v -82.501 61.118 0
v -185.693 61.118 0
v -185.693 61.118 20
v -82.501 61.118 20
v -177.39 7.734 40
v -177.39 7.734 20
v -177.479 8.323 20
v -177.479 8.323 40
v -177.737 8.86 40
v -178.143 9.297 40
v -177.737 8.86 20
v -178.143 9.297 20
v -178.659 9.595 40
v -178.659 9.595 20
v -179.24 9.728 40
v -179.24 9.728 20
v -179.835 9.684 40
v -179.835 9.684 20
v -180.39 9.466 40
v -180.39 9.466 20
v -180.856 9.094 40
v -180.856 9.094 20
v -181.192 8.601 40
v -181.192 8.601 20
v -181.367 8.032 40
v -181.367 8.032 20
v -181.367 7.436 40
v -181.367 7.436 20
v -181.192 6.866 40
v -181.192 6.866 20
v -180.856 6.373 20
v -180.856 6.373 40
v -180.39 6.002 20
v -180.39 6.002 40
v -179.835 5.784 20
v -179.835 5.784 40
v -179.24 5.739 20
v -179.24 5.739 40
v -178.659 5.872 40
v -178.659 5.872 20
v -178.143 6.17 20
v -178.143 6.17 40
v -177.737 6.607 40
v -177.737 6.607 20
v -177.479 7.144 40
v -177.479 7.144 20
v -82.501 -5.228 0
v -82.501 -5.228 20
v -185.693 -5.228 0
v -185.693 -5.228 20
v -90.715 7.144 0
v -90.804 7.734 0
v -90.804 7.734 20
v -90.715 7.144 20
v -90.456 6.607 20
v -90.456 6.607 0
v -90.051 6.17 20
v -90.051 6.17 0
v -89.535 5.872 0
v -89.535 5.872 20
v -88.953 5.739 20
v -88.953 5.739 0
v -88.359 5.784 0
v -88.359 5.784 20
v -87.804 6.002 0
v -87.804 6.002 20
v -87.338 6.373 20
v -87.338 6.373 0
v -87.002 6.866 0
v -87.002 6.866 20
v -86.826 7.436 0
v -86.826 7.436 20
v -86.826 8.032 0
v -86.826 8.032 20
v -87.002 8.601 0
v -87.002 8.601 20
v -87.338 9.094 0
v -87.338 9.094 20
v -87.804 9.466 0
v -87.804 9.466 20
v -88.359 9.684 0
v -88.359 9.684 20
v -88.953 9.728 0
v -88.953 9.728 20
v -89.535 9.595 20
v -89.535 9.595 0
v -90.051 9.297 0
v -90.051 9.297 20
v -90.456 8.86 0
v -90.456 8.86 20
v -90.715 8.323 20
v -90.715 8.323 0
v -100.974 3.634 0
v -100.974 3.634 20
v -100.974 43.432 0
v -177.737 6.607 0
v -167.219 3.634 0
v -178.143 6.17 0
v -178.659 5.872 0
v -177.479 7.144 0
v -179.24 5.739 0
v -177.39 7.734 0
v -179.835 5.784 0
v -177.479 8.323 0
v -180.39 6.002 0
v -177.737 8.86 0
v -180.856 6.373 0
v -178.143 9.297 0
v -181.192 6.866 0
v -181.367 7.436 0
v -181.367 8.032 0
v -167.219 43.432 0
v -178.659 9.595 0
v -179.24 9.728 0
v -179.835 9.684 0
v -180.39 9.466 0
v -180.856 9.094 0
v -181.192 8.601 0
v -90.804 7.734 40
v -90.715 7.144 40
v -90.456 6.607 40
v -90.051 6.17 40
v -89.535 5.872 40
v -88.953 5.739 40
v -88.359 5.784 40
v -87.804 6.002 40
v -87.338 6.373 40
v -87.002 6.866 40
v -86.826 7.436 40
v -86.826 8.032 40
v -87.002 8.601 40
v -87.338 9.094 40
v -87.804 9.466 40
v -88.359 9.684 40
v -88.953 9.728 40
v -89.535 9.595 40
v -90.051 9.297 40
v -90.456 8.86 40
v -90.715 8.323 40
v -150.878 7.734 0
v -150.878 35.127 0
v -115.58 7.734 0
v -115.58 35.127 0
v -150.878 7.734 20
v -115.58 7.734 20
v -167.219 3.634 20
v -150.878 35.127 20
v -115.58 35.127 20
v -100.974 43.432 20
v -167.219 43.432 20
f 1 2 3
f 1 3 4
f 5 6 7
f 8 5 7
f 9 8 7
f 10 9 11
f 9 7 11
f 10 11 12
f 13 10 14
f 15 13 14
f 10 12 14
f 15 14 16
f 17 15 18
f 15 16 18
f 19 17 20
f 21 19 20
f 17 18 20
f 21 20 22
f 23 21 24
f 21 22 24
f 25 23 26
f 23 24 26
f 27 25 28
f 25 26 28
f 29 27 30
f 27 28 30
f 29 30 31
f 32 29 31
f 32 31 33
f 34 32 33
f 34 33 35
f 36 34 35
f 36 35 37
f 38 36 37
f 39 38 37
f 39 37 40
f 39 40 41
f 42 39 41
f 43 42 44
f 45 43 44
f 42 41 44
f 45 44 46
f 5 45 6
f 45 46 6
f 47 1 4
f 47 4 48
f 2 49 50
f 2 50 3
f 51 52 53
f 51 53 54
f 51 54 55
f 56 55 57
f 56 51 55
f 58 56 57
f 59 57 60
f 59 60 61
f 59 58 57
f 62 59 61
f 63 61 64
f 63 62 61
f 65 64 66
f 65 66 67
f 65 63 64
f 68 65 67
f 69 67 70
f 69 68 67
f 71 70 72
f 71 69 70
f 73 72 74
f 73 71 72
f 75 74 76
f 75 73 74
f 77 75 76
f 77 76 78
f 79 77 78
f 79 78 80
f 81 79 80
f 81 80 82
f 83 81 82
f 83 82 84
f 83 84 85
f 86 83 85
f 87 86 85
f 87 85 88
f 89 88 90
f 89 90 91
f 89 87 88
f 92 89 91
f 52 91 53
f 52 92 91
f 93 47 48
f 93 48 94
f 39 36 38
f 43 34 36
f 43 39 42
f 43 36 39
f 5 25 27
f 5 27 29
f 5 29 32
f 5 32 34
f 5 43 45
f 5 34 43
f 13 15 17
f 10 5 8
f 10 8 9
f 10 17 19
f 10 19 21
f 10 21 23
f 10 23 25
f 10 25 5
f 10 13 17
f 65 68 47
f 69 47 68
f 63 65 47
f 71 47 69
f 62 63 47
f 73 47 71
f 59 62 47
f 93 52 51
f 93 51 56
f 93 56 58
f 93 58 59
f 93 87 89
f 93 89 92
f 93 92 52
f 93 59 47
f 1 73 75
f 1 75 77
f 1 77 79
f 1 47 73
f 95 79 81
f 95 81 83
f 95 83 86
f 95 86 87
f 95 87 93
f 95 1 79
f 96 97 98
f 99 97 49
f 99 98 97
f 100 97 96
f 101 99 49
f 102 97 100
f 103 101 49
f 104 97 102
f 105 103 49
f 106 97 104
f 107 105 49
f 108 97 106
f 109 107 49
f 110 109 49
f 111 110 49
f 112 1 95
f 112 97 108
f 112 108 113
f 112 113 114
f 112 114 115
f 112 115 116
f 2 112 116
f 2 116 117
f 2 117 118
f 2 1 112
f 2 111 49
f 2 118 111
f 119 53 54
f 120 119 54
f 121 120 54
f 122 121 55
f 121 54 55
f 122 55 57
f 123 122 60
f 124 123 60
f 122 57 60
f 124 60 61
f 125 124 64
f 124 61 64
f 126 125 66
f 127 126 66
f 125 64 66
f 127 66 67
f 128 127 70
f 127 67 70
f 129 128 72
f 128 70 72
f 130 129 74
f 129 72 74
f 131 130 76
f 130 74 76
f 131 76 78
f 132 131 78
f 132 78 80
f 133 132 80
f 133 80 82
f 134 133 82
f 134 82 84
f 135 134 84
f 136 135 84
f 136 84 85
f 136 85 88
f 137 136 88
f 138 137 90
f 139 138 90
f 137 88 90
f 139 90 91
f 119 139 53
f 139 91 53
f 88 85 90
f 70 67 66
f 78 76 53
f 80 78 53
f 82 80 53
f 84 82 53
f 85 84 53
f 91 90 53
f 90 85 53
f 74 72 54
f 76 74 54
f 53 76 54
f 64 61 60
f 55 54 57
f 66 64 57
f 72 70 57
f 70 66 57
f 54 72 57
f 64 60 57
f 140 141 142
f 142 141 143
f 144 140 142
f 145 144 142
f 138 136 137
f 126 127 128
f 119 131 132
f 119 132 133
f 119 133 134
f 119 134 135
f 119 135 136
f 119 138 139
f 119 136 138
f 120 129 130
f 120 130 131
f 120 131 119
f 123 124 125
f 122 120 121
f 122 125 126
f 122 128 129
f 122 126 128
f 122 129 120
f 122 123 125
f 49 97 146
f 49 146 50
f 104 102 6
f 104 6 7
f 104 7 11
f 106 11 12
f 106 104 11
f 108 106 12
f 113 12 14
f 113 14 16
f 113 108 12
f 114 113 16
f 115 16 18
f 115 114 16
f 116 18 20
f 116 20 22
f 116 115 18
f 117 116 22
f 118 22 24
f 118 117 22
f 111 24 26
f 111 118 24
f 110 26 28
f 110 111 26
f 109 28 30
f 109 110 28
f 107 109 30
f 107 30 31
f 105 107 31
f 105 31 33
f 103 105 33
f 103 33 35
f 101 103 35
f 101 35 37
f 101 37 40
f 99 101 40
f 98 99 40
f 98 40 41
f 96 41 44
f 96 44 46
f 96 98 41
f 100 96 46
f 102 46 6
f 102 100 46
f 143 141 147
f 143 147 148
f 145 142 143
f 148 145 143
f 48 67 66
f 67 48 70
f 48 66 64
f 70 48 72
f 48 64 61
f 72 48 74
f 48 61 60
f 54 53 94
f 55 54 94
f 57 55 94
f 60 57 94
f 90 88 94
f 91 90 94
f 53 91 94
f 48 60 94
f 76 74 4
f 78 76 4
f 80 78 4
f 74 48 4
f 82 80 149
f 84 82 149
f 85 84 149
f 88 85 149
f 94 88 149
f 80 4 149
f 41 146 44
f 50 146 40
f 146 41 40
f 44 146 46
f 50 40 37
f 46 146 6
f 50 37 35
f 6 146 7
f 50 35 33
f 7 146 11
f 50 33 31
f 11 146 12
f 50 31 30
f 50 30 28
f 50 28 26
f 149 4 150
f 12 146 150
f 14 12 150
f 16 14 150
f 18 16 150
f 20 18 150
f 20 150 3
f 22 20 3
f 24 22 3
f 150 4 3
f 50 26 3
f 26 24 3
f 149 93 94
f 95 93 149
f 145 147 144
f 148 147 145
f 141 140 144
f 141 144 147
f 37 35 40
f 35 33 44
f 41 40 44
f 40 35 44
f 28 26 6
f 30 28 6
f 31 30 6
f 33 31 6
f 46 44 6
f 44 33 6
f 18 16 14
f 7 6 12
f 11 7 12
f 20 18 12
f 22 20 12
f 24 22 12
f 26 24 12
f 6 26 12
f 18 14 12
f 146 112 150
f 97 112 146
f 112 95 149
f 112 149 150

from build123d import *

# Parameters (mm, degrees)
SKETCH2_R            = 2
BOSS_EXTRUDE10_DEPTH = 20
SKETCH7_R            = 2
BOSS_EXTRUDE11_DEPTH = 20
SKETCH8_R            = 2
BOSS_EXTRUDE12_DEPTH = 20
SKETCH2_14_W         = 35.298621591
SKETCH2_14_H         = 27.393492294
BOSS_EXTRUDE13_DEPTH = 20


with BuildPart() as part:
    # Sketch2 → Boss-Extrude10 (new body)
    with BuildSketch(Plane.XY):
        Polygon((-185.692642178, -5.228439236), (-185.692642178, 61.118289384), (-82.501134399, 61.118289384), (-82.501134399, -5.228439236), (-100.974320011, 3.634455591), (-100.974320011, 43.432435389), (-167.219456565, 43.432435389), (-167.219456565, 3.634455591), align=None)
        with Locations((-179.389800335, 7.733691034)):
            Circle(SKETCH2_R, mode=Mode.SUBTRACT)
        with Locations((-88.803976242, 7.733691034)):
            Circle(SKETCH2_R, mode=Mode.SUBTRACT)
    extrude(amount=BOSS_EXTRUDE10_DEPTH)


with BuildPart() as body_2:
    # Sketch7 → Boss-Extrude11 (new body)
    with BuildSketch(Plane.XY.offset(20)):
        with Locations((-179.389800335, 7.733691034)):
            Circle(SKETCH7_R)
    extrude(amount=BOSS_EXTRUDE11_DEPTH)


with BuildPart() as body_3:
    # Sketch8 → Boss-Extrude12 (new body)
    with BuildSketch(Plane.XY.offset(20)):
        with Locations((-88.803976242, 7.733691034)):
            Circle(SKETCH8_R)
    extrude(amount=BOSS_EXTRUDE12_DEPTH)


with BuildPart() as body_4:
    # Sketch2<14> → Boss-Extrude13 (new body)
    with BuildSketch(Plane.XY):
        with Locations((-133.229015837, 21.430437181)):
            Rectangle(SKETCH2_14_W, SKETCH2_14_H)
    extrude(amount=BOSS_EXTRUDE13_DEPTH)


solid = Compound([part.part, body_2.part, body_3.part, body_4.part])
